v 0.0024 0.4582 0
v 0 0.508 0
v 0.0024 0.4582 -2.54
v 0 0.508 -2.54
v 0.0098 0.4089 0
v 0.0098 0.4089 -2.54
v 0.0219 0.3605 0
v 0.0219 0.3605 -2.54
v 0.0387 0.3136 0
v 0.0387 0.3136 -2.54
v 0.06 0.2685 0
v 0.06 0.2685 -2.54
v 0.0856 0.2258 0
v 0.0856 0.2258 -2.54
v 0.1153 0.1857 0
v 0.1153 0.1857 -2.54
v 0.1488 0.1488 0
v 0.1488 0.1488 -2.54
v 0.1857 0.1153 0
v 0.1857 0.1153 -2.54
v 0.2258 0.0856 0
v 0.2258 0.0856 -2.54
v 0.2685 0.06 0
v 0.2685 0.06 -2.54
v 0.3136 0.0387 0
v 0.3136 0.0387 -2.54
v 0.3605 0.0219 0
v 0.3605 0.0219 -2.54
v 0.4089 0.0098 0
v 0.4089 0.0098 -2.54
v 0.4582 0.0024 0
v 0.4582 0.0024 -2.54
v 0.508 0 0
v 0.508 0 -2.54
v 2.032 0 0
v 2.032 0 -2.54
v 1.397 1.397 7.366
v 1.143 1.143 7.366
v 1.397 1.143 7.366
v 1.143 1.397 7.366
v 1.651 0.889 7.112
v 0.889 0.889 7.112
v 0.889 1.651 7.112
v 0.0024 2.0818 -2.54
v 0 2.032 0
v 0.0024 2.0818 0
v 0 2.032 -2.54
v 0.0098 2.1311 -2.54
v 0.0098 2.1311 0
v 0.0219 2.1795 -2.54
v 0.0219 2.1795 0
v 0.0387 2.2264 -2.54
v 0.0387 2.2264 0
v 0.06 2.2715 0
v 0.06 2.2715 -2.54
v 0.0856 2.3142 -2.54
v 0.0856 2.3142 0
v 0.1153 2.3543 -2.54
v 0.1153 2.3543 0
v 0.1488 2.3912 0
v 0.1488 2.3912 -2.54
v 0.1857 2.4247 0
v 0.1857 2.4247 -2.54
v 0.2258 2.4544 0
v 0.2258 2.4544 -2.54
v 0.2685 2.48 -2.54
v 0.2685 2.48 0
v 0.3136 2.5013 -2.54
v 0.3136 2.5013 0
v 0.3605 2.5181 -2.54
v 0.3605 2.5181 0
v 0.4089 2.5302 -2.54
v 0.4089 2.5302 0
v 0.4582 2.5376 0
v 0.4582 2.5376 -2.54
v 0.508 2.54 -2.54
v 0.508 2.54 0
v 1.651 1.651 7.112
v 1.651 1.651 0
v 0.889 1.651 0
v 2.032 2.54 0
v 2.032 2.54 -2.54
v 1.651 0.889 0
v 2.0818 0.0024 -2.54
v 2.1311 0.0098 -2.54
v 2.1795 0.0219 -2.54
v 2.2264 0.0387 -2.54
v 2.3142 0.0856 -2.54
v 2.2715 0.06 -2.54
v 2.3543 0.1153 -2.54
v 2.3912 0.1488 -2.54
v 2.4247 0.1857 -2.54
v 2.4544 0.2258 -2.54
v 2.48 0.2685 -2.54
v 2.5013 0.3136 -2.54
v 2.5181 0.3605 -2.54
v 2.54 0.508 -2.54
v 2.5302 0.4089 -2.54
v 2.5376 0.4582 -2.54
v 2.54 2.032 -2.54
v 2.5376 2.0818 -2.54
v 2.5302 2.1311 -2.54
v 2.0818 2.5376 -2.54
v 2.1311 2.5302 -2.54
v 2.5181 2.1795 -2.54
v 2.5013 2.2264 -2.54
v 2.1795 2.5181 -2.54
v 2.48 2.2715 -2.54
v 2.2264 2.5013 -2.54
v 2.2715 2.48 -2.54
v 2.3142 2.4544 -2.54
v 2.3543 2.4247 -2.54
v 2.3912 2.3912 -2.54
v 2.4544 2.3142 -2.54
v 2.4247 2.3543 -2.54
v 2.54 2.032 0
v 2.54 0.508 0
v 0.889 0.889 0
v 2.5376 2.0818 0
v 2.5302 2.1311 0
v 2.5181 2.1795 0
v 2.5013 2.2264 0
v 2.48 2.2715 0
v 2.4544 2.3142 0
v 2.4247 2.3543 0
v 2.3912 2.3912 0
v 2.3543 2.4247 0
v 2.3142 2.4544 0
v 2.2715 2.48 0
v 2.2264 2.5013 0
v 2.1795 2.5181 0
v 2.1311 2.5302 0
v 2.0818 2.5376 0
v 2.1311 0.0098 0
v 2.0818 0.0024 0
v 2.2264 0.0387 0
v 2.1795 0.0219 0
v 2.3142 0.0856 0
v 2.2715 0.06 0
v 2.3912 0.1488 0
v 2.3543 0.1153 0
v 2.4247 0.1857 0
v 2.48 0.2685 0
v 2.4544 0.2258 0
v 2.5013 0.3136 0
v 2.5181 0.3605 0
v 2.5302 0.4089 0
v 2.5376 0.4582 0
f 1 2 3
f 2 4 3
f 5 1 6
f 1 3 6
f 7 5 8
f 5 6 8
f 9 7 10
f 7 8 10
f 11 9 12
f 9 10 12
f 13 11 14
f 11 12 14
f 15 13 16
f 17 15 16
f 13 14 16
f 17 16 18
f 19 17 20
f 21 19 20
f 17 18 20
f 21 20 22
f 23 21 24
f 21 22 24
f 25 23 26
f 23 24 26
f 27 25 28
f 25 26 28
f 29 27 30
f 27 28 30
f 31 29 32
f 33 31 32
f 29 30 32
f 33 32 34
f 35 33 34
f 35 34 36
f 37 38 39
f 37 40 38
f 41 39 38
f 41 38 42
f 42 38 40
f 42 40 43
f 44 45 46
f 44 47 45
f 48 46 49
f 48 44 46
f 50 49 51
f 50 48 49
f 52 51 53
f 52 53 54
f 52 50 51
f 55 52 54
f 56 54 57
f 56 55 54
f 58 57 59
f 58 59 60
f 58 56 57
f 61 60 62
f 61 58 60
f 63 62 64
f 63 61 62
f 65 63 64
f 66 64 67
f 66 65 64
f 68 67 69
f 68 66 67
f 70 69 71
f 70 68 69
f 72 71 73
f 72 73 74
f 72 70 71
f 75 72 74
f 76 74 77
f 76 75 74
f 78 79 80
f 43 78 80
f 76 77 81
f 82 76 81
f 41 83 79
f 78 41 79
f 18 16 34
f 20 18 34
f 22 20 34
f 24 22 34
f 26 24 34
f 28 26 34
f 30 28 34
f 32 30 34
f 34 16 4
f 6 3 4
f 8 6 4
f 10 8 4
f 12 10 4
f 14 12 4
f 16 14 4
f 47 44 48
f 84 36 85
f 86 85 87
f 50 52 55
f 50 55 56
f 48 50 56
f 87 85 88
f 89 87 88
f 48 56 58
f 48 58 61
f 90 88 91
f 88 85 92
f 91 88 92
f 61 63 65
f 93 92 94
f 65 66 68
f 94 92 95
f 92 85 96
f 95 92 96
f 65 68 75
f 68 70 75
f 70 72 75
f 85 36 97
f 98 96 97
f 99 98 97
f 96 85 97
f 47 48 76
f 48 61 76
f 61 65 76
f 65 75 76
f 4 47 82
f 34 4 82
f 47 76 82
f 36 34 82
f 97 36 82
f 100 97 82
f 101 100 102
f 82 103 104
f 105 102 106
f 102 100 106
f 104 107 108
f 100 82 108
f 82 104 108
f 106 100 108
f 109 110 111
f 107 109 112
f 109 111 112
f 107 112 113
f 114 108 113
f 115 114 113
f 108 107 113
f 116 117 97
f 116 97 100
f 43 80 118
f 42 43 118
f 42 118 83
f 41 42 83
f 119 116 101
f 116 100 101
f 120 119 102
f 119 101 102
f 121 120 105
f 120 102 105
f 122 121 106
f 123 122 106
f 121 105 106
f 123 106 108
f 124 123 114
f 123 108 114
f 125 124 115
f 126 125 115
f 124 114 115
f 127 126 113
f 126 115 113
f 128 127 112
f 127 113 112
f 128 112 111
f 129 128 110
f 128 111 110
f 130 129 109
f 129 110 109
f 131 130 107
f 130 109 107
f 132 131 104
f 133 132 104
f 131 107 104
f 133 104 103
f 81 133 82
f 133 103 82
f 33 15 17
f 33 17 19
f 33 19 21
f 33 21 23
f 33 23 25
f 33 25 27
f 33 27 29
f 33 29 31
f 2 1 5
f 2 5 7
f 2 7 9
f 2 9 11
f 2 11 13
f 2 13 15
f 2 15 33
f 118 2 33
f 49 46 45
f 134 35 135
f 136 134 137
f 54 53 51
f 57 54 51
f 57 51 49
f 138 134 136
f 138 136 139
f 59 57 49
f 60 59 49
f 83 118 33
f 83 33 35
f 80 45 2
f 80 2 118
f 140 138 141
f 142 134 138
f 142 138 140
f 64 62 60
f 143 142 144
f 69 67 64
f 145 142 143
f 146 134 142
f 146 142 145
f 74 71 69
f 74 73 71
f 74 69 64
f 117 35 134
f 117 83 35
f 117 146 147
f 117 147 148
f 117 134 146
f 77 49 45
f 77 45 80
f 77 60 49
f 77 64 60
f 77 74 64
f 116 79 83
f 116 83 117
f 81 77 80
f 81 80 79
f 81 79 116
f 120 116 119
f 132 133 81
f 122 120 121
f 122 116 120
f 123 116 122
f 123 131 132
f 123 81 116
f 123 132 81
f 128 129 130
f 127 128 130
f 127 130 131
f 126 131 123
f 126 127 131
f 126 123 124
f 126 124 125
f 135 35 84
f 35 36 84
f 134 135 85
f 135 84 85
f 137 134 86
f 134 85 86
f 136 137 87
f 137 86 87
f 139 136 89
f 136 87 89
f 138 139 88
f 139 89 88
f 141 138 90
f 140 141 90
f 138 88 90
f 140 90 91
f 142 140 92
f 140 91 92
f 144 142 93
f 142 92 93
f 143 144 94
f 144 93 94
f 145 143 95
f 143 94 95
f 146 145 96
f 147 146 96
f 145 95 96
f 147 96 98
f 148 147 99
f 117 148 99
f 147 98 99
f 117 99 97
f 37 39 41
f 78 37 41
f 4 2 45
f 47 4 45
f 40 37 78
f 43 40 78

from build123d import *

# Parameters (mm, degrees)
SKETCH_2_W          = 2.54
SKETCH_2_H          = 2.54
EXTRUDE_1_DEPTH     = 2.54
FILLET_1_R          = 0.508
EXTRUDE_2_DEPTH     = 7.366
CUT_EXTRUDE_1_DEPTH = 8.96463163
CUT_EXTRUDE_3_DEPTH = 8.96463163


with BuildPart() as part:
    # 草图2 → 凸台-拉伸1 (new body)
    with BuildSketch(Plane.XY):
        with Locations((1.27, 1.27)):
            Rectangle(SKETCH_2_W, SKETCH_2_H)
    extrude(amount=-EXTRUDE_1_DEPTH)

    # 圆角1
    fillet_1_edges = [part.edges().sort_by_distance(p)[0] for p in [
        (0, 2.54, -1.27),
        (2.54, 2.54, -1.27),
        (2.54, 0, -1.27),
        (0, 0, -1.27),
    ]]
    fillet(fillet_1_edges, radius=FILLET_1_R)

    # 草图3 → 凸台-拉伸2 (add)
    with BuildSketch(Plane.XY):
        Polygon((1.651, 1.27), (1.651, 1.651), (0.889, 1.651), (0.889, 0.889), (1.651, 0.889), align=None)
    extrude(amount=EXTRUDE_2_DEPTH)

    # 草图4 → 切除-拉伸1 (cut, through all)
    with BuildSketch(Plane(origin=(1.651, 0, 0), x_dir=(0, 0, -1), z_dir=(1, 0, 0))):
        Polygon((-7.366, 0.889), (-7.366, 1.143), (-7.112, 0.889), align=None)
        Polygon((-7.366, 1.397), (-7.112, 1.651), (-7.366, 1.651), align=None)
    extrude(amount=-CUT_EXTRUDE_1_DEPTH, mode=Mode.SUBTRACT)

    # 草图6 → 切除-拉伸3 (cut, through all)
    with BuildSketch(Plane(origin=(0, 0.889, 0), x_dir=(-1, 0, 0), z_dir=(0, -1, 0))):
        Polygon((-1.143, -7.366), (-0.889, -7.112), (-0.889, -7.366), align=None)
        Polygon((-1.651, -7.366), (-1.397, -7.366), (-1.651, -7.112), align=None)
    extrude(amount=-CUT_EXTRUDE_3_DEPTH, mode=Mode.SUBTRACT)


solid = part.part
